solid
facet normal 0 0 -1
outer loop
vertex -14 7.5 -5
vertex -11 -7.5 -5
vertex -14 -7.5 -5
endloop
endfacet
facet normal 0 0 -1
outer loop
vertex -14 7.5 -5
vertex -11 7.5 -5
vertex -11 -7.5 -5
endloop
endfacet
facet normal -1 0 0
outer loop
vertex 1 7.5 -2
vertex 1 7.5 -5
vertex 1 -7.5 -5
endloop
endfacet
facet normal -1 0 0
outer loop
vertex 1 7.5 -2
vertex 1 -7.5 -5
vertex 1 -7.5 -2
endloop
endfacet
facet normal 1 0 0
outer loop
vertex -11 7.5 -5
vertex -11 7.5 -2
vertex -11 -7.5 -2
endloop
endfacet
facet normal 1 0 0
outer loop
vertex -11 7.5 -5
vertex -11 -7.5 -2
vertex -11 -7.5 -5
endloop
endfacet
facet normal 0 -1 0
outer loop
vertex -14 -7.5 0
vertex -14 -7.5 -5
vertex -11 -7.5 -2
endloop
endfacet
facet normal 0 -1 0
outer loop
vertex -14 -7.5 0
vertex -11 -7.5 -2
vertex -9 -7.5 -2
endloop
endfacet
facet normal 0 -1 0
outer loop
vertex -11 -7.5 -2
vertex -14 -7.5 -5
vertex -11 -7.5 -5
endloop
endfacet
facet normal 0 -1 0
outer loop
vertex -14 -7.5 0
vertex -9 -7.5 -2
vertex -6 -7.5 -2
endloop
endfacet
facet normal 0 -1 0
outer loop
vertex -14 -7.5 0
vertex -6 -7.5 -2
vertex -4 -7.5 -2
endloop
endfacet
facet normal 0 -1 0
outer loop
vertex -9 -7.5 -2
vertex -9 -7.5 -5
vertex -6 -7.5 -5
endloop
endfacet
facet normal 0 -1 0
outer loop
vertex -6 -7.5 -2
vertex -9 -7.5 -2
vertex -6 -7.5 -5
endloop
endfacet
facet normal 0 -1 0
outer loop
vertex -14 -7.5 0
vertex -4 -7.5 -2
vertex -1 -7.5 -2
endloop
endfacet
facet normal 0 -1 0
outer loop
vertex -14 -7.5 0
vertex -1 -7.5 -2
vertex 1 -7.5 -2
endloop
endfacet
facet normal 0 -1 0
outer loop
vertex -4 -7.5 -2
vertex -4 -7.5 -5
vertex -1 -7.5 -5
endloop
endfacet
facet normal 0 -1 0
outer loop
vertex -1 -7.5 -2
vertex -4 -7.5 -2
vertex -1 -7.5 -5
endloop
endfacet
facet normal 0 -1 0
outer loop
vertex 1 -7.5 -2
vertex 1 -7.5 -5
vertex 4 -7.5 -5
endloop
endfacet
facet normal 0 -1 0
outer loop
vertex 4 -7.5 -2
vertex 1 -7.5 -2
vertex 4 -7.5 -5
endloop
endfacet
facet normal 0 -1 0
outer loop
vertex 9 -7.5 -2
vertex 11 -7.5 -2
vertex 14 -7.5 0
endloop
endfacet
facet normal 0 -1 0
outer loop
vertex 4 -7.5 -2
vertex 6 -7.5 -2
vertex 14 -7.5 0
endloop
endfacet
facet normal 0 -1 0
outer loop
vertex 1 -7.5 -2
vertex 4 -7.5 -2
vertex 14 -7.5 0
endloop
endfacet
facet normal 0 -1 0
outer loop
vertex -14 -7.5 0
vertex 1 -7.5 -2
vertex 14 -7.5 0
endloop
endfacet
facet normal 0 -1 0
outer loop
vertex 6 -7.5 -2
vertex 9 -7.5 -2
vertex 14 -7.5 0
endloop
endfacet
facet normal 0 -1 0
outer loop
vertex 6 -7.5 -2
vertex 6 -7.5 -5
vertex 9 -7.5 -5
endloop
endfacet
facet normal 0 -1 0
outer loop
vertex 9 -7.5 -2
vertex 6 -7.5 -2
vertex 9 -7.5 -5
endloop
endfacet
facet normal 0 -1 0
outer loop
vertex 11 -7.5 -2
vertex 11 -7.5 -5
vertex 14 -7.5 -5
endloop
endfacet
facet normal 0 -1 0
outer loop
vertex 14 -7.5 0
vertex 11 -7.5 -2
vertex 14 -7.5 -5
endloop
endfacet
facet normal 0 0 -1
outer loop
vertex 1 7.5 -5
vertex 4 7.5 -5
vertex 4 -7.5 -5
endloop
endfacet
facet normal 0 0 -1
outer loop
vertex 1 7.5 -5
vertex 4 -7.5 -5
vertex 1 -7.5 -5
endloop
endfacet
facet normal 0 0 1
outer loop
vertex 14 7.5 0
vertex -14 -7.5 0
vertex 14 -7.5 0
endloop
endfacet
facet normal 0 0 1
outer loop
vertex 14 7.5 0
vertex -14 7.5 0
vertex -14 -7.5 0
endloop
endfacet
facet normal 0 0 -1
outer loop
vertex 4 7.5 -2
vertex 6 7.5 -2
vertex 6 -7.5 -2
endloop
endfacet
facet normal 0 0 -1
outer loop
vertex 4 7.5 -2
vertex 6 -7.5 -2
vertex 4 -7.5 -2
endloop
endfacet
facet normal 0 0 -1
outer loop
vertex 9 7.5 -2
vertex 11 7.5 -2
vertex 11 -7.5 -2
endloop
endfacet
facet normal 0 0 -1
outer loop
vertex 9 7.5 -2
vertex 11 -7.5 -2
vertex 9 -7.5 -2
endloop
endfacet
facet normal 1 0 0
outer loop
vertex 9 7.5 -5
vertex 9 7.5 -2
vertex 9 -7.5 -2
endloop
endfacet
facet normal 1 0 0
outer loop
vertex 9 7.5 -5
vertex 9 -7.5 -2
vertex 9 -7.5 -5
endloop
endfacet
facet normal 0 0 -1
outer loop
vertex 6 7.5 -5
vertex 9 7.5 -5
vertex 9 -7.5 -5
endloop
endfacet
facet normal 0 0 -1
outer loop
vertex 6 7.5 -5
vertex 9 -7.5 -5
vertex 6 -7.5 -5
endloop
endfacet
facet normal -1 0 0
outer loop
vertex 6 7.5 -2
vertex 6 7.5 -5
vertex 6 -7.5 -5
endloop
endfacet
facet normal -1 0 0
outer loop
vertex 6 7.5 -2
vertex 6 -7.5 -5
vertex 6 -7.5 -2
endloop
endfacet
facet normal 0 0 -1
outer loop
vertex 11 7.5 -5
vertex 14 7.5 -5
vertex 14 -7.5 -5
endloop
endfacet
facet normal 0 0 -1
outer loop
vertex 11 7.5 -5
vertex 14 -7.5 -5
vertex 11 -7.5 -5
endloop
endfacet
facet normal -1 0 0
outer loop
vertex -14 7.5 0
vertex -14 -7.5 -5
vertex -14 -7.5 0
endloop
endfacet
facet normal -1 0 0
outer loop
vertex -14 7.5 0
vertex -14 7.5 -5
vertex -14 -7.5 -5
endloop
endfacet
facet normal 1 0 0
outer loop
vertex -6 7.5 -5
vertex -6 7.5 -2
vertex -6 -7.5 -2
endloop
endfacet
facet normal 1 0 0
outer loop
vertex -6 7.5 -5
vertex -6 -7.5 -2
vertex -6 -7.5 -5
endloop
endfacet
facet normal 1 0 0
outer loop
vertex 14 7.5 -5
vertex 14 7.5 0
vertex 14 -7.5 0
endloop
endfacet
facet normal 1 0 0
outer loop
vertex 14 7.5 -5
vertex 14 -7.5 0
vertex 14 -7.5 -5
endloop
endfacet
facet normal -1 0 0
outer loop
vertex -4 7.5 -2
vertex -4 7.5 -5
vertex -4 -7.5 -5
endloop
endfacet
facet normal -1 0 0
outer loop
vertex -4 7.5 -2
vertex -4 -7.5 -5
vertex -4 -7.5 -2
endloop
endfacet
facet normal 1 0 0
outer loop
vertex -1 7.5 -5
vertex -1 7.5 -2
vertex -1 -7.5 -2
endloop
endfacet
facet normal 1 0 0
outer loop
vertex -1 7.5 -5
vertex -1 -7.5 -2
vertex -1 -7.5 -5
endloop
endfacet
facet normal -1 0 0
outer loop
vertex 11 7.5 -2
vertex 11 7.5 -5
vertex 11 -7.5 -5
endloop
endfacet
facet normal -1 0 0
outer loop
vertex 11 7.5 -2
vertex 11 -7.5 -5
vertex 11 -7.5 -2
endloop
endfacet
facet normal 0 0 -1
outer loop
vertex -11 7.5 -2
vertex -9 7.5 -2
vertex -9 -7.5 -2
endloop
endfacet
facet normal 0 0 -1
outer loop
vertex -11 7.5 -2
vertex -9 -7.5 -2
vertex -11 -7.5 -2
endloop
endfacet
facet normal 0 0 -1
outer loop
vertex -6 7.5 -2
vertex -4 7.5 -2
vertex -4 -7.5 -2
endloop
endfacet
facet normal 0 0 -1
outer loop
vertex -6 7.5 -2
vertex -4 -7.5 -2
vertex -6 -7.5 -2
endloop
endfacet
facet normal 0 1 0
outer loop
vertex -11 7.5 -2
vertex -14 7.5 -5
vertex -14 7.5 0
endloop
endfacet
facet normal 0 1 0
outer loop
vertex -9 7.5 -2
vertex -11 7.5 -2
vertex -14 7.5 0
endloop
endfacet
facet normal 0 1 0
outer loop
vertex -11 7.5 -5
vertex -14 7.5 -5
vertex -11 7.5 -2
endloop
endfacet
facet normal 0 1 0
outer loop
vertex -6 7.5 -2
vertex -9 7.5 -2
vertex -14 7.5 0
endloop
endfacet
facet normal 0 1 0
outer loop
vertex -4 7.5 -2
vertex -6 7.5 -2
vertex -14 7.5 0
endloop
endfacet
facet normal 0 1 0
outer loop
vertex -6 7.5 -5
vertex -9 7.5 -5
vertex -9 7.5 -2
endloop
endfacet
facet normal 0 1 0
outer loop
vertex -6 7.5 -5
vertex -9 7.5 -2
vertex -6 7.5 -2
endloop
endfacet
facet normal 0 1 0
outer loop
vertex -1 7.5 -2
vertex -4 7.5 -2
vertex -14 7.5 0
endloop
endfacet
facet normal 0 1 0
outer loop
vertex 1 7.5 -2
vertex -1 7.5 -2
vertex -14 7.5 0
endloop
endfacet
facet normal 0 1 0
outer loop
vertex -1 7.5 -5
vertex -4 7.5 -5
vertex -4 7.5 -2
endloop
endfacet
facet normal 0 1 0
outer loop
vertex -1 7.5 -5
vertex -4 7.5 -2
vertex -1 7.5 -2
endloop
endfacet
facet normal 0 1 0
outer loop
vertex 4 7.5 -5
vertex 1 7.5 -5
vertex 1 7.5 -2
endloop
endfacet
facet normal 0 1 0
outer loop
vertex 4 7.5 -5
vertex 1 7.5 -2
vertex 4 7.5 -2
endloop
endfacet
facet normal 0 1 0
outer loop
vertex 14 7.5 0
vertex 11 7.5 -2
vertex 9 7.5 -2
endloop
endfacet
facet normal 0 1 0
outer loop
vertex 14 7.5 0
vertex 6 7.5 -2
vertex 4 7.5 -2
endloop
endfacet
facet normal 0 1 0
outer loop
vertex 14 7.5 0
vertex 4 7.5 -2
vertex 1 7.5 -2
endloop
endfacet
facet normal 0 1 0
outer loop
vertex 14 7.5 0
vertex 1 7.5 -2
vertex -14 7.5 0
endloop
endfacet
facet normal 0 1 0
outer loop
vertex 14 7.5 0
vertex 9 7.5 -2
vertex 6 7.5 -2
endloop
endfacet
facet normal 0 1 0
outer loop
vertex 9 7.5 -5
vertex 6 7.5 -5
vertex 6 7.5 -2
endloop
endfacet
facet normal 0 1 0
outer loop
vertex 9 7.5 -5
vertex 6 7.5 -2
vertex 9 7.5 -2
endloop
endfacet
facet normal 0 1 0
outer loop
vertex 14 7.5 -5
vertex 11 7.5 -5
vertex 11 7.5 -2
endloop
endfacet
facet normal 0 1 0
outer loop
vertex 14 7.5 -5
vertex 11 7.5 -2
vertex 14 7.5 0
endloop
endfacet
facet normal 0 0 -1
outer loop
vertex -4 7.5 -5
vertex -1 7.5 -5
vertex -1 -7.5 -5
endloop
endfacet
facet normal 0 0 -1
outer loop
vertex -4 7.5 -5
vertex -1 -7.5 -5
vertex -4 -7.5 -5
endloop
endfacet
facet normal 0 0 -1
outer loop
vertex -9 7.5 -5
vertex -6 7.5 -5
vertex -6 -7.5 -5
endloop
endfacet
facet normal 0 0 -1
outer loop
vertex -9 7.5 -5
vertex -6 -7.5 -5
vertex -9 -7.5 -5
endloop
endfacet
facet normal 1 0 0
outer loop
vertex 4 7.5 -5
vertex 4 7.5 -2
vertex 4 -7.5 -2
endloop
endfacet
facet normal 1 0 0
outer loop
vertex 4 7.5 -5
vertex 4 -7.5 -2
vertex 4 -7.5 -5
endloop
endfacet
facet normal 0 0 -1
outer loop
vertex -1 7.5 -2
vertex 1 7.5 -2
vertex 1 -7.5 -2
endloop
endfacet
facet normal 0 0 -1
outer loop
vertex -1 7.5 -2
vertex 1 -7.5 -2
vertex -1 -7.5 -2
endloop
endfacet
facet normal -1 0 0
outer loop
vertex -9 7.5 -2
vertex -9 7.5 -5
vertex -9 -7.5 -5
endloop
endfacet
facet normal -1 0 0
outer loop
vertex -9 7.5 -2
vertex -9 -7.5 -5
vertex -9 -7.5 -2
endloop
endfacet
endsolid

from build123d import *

# Parameters (mm, degrees)
BOSS_EXTRUDE4_DEPTH = 7.5


with BuildPart() as part:
    # Sketch3 → Boss-Extrude4 (new, symmetric)
    with BuildSketch(Plane(origin=(0, 0, 0), x_dir=(1, 0, 0), z_dir=(0, 1, 0))):
        Polygon((-14, 0), (14, 0), (14, 5), (11, 5), (11, 2), (9, 2), (9, 5), (6, 5), (6, 2), (4, 2), (4, 5), (1, 5), (1, 2), (-1, 2), (-1, 5), (-4, 5), (-4, 2), (-6, 2), (-6, 5), (-9, 5), (-9, 2), (-11, 2), (-11, 5), (-14, 5), align=None)
    extrude(amount=BOSS_EXTRUDE4_DEPTH, both=True)


solid = part.part
